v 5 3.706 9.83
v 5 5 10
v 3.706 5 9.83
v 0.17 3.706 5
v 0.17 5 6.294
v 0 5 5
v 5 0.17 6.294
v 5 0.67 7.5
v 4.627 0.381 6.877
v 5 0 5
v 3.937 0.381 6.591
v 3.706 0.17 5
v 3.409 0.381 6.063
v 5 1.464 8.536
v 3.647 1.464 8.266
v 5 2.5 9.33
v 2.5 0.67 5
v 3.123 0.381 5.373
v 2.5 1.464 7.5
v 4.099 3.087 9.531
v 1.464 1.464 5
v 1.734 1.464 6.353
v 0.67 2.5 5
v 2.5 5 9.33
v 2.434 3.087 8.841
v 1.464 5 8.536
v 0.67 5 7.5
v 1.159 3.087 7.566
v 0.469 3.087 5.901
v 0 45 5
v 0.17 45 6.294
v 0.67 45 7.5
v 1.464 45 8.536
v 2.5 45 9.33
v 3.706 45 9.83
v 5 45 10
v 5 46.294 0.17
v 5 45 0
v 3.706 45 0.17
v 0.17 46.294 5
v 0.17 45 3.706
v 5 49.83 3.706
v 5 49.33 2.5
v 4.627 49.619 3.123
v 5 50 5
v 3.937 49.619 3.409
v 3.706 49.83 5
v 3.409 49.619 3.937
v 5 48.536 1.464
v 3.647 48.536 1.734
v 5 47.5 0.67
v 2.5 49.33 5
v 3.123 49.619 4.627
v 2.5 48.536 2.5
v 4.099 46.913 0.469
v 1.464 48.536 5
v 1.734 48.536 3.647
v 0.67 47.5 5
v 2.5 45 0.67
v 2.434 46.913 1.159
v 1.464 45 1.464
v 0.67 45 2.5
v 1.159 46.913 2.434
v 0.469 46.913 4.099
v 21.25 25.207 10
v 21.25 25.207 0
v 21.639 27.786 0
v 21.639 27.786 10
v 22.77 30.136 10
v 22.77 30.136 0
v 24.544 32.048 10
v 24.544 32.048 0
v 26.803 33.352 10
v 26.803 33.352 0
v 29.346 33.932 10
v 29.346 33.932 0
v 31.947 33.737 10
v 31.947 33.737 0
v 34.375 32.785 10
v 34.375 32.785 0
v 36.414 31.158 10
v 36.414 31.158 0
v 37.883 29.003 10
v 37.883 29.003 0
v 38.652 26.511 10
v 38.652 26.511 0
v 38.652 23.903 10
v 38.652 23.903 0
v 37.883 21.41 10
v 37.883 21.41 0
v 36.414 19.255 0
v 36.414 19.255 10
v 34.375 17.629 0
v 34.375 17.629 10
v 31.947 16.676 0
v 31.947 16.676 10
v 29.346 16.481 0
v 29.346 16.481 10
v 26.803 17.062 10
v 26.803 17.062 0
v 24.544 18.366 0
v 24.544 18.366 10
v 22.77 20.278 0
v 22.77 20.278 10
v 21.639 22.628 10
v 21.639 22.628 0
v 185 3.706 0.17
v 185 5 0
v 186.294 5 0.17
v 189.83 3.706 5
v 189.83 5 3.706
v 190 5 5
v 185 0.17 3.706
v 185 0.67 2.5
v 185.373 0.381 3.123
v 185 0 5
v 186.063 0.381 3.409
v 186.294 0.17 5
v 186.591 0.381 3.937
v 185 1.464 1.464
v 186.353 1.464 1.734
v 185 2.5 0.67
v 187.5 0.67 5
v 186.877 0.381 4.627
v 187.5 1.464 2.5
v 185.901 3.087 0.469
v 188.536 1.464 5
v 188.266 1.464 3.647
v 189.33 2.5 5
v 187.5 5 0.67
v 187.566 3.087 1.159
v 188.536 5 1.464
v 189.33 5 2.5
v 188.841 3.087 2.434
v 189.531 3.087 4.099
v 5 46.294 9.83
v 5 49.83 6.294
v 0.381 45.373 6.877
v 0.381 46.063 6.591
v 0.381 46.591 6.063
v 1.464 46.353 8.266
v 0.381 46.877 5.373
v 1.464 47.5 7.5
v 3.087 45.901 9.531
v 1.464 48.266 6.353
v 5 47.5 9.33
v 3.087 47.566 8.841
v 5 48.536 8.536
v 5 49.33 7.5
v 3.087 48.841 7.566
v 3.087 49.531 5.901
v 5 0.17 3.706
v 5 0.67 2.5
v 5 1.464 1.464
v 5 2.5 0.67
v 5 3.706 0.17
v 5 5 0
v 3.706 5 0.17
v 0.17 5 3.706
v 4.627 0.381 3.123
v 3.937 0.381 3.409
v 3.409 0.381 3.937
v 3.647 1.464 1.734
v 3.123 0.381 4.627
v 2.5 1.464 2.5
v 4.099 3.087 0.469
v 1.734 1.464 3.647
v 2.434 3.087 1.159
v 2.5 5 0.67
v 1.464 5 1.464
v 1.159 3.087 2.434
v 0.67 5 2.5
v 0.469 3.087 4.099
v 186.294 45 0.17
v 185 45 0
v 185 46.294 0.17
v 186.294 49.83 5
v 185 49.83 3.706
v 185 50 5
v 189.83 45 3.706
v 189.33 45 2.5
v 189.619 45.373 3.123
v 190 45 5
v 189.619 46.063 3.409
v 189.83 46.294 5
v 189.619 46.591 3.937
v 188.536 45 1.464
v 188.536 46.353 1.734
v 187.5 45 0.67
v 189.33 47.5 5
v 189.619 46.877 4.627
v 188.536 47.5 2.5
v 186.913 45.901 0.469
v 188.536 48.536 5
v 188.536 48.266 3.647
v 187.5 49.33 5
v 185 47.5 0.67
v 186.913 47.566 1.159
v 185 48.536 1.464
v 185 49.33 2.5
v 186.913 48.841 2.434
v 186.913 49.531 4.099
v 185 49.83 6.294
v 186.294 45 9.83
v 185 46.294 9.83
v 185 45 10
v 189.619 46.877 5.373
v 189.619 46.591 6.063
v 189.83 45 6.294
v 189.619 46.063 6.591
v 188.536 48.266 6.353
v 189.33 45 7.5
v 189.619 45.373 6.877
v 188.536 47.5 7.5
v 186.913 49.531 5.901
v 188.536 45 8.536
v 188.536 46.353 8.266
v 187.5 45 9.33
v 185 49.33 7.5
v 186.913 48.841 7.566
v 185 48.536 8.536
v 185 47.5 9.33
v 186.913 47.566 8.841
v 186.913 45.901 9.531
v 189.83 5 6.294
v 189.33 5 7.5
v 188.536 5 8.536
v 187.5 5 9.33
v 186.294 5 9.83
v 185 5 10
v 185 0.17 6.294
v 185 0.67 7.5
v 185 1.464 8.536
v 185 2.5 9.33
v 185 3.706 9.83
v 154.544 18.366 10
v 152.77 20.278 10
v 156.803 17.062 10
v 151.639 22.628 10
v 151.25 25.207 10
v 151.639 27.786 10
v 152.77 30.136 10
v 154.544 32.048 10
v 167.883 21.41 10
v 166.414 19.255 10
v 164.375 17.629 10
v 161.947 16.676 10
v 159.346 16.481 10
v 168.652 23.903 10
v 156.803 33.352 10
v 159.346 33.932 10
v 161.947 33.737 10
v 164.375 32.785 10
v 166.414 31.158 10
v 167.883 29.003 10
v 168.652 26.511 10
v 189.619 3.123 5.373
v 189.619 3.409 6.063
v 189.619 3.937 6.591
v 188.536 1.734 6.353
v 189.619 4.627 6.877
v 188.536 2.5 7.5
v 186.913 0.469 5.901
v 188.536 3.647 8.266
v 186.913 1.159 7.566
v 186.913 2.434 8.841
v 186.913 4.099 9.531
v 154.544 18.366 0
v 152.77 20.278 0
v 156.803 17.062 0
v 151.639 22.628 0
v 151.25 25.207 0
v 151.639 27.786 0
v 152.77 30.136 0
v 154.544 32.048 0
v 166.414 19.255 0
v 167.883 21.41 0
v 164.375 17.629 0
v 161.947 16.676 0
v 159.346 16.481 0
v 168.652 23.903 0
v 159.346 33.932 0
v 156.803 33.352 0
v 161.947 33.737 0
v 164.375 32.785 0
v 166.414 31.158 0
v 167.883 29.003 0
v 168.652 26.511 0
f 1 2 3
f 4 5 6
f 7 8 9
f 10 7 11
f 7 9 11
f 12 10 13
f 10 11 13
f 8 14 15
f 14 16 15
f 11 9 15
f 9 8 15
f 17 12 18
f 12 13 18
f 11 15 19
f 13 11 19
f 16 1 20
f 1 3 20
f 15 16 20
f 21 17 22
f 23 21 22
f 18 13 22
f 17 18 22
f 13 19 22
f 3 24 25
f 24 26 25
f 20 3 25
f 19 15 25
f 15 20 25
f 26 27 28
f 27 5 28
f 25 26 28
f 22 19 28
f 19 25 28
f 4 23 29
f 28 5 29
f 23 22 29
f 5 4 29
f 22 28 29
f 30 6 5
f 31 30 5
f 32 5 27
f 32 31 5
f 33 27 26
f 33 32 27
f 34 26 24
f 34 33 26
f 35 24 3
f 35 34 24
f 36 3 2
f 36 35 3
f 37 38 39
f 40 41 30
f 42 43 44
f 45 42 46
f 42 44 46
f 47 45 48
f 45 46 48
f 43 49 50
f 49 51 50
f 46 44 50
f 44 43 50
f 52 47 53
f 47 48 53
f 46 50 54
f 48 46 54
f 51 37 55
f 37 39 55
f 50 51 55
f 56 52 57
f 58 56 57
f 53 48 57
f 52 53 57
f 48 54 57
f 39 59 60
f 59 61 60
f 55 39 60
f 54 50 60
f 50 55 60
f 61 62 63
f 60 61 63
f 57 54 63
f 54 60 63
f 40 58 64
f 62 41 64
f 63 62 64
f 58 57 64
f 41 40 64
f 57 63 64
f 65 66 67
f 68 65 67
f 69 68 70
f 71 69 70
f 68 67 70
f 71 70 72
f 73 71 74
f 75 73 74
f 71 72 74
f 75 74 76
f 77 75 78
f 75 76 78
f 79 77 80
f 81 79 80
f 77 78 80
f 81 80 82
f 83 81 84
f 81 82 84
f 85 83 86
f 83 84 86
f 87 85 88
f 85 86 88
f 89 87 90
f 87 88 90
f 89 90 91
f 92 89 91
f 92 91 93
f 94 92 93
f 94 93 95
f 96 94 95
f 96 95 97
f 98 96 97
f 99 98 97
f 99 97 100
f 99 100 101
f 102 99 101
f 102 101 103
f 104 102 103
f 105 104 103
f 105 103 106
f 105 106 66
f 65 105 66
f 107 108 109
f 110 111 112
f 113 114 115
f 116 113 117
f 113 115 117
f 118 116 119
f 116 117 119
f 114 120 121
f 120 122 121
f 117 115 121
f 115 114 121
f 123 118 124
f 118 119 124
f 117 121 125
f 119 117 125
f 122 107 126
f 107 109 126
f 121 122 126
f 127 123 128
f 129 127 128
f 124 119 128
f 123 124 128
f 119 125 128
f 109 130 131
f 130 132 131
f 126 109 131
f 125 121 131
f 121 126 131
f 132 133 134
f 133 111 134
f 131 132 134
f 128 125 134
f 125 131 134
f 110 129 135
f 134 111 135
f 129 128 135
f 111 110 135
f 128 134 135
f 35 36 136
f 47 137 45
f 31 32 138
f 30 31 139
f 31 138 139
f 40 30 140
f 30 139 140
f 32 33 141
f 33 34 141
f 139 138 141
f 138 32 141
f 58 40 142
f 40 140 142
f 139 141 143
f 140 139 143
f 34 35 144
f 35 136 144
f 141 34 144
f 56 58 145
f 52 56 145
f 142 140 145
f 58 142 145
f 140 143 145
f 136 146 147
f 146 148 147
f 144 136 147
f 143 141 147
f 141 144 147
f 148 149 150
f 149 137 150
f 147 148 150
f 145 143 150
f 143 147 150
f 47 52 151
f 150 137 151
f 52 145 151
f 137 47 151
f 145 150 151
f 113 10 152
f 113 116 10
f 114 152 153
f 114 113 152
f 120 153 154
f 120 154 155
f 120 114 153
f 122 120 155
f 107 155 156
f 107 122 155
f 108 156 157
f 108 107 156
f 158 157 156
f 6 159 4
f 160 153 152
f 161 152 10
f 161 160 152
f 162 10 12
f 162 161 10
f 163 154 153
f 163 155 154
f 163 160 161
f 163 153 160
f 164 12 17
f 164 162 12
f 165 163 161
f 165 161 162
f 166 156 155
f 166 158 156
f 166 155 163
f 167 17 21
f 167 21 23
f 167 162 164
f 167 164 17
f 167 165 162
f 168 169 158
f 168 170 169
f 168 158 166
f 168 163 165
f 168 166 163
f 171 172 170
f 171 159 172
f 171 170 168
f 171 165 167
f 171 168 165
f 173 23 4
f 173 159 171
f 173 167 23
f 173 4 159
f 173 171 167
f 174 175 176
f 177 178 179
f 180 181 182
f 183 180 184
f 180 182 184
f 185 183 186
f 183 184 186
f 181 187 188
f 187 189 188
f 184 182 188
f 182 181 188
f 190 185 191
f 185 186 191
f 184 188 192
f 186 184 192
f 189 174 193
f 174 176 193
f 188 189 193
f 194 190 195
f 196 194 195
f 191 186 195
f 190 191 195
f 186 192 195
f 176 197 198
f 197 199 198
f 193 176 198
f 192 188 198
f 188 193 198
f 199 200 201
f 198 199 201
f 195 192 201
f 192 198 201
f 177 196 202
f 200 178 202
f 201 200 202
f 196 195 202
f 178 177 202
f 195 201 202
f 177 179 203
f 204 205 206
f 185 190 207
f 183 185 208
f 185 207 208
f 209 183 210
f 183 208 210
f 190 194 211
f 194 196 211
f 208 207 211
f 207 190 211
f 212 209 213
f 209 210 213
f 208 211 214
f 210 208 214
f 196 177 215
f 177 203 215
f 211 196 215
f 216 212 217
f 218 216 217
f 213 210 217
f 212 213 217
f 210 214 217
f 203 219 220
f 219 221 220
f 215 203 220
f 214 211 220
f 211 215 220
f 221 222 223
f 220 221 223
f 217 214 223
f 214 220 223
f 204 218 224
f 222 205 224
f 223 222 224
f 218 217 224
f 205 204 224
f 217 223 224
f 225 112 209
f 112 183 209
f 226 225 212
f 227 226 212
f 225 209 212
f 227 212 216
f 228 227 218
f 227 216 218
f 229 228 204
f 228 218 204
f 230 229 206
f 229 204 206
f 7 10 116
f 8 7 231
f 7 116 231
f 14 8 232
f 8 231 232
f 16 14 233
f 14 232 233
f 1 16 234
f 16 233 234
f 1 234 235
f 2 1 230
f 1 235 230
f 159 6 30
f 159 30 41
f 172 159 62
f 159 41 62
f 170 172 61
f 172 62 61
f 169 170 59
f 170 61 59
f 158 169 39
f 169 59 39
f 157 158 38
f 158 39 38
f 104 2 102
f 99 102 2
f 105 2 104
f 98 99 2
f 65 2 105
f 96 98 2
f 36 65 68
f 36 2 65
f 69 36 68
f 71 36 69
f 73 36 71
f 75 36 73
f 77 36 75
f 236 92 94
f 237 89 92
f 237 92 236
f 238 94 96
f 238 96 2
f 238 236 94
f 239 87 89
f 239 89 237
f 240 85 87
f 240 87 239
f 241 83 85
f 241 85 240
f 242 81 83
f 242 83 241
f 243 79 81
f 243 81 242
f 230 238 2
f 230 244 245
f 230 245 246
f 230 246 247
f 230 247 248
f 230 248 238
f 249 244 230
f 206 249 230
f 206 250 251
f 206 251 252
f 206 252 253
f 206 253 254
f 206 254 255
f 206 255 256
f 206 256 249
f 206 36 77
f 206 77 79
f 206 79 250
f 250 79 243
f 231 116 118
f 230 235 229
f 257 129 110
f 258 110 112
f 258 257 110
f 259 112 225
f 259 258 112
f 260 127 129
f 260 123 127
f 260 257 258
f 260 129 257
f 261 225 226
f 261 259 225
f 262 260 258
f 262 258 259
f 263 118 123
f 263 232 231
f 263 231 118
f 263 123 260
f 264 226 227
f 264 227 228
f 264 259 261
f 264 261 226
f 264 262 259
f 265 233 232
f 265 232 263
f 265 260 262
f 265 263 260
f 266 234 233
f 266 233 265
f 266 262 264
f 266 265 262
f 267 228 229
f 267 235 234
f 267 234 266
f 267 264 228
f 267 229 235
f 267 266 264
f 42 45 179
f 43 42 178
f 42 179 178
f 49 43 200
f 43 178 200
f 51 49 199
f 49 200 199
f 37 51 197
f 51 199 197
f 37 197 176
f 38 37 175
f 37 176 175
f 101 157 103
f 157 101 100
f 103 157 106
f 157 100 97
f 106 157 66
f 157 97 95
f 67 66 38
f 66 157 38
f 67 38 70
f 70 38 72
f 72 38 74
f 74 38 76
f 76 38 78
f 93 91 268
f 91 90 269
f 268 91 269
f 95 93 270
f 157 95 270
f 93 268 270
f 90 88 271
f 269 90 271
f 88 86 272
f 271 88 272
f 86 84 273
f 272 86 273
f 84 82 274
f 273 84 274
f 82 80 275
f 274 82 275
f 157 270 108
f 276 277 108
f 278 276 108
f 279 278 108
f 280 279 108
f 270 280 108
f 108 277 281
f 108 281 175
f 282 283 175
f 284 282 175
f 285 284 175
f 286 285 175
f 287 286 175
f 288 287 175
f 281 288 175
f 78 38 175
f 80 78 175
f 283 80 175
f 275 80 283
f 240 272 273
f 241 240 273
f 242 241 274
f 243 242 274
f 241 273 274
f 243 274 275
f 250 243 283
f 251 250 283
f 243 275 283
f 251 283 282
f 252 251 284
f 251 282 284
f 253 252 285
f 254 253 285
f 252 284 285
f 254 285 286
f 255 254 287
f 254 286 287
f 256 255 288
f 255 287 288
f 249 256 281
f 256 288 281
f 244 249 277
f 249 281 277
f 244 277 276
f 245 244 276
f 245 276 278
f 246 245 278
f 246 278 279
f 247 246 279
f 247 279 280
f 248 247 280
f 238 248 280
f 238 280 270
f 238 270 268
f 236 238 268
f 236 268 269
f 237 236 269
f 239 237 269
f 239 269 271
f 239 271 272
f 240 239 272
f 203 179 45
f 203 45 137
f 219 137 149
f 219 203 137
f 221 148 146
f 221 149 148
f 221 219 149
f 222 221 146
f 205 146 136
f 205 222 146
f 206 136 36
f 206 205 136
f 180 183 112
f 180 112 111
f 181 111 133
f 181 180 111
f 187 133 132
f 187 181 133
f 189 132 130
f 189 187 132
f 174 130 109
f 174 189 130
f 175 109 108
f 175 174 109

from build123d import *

# Parameters (mm, degrees)
ESBO_O1_W                                = 190
ESBO_O1_H                                = 50
RESSALTO_EXTRUS_O1_DEPTH                 = 10
FILETE1_R                                = 5
BROCA_DE_ROSQUEAR_PARA_TARRAXA_DE_M201_D = 17.5


with BuildPart() as part:
    # Esboço1 → Ressalto-extrusão1 (new body)
    with BuildSketch(Plane.XY):
        with Locations((95, 25)):
            Rectangle(ESBO_O1_W, ESBO_O1_H)
    extrude(amount=RESSALTO_EXTRUS_O1_DEPTH)

    # Filete1
    filete1_edges = [part.edges().sort_by_distance(p)[0] for p in [
        (95, 50, 10),
        (0, 25, 10),
        (95, 0, 10),
        (0, 25, 0),
        (95, 50, 0),
        (190, 25, 0),
        (95, 0, 0),
        (0, 0, 5),
        (0, 50, 5),
        (190, 50, 5),
        (190, 0, 5),
        (190, 25, 10),
    ]]
    fillet(filete1_edges, radius=FILETE1_R - 0.0001)  # a hair under: the kernel refuses the full size

    # Broca de rosquear para tarraxa de M201 (through all)
    with Locations(Plane.XY.offset(10)):
        with Locations((30, 25.206865572), (160, 25.206865572)):
            Hole(BROCA_DE_ROSQUEAR_PARA_TARRAXA_DE_M201_D / 2)


solid = part.part
